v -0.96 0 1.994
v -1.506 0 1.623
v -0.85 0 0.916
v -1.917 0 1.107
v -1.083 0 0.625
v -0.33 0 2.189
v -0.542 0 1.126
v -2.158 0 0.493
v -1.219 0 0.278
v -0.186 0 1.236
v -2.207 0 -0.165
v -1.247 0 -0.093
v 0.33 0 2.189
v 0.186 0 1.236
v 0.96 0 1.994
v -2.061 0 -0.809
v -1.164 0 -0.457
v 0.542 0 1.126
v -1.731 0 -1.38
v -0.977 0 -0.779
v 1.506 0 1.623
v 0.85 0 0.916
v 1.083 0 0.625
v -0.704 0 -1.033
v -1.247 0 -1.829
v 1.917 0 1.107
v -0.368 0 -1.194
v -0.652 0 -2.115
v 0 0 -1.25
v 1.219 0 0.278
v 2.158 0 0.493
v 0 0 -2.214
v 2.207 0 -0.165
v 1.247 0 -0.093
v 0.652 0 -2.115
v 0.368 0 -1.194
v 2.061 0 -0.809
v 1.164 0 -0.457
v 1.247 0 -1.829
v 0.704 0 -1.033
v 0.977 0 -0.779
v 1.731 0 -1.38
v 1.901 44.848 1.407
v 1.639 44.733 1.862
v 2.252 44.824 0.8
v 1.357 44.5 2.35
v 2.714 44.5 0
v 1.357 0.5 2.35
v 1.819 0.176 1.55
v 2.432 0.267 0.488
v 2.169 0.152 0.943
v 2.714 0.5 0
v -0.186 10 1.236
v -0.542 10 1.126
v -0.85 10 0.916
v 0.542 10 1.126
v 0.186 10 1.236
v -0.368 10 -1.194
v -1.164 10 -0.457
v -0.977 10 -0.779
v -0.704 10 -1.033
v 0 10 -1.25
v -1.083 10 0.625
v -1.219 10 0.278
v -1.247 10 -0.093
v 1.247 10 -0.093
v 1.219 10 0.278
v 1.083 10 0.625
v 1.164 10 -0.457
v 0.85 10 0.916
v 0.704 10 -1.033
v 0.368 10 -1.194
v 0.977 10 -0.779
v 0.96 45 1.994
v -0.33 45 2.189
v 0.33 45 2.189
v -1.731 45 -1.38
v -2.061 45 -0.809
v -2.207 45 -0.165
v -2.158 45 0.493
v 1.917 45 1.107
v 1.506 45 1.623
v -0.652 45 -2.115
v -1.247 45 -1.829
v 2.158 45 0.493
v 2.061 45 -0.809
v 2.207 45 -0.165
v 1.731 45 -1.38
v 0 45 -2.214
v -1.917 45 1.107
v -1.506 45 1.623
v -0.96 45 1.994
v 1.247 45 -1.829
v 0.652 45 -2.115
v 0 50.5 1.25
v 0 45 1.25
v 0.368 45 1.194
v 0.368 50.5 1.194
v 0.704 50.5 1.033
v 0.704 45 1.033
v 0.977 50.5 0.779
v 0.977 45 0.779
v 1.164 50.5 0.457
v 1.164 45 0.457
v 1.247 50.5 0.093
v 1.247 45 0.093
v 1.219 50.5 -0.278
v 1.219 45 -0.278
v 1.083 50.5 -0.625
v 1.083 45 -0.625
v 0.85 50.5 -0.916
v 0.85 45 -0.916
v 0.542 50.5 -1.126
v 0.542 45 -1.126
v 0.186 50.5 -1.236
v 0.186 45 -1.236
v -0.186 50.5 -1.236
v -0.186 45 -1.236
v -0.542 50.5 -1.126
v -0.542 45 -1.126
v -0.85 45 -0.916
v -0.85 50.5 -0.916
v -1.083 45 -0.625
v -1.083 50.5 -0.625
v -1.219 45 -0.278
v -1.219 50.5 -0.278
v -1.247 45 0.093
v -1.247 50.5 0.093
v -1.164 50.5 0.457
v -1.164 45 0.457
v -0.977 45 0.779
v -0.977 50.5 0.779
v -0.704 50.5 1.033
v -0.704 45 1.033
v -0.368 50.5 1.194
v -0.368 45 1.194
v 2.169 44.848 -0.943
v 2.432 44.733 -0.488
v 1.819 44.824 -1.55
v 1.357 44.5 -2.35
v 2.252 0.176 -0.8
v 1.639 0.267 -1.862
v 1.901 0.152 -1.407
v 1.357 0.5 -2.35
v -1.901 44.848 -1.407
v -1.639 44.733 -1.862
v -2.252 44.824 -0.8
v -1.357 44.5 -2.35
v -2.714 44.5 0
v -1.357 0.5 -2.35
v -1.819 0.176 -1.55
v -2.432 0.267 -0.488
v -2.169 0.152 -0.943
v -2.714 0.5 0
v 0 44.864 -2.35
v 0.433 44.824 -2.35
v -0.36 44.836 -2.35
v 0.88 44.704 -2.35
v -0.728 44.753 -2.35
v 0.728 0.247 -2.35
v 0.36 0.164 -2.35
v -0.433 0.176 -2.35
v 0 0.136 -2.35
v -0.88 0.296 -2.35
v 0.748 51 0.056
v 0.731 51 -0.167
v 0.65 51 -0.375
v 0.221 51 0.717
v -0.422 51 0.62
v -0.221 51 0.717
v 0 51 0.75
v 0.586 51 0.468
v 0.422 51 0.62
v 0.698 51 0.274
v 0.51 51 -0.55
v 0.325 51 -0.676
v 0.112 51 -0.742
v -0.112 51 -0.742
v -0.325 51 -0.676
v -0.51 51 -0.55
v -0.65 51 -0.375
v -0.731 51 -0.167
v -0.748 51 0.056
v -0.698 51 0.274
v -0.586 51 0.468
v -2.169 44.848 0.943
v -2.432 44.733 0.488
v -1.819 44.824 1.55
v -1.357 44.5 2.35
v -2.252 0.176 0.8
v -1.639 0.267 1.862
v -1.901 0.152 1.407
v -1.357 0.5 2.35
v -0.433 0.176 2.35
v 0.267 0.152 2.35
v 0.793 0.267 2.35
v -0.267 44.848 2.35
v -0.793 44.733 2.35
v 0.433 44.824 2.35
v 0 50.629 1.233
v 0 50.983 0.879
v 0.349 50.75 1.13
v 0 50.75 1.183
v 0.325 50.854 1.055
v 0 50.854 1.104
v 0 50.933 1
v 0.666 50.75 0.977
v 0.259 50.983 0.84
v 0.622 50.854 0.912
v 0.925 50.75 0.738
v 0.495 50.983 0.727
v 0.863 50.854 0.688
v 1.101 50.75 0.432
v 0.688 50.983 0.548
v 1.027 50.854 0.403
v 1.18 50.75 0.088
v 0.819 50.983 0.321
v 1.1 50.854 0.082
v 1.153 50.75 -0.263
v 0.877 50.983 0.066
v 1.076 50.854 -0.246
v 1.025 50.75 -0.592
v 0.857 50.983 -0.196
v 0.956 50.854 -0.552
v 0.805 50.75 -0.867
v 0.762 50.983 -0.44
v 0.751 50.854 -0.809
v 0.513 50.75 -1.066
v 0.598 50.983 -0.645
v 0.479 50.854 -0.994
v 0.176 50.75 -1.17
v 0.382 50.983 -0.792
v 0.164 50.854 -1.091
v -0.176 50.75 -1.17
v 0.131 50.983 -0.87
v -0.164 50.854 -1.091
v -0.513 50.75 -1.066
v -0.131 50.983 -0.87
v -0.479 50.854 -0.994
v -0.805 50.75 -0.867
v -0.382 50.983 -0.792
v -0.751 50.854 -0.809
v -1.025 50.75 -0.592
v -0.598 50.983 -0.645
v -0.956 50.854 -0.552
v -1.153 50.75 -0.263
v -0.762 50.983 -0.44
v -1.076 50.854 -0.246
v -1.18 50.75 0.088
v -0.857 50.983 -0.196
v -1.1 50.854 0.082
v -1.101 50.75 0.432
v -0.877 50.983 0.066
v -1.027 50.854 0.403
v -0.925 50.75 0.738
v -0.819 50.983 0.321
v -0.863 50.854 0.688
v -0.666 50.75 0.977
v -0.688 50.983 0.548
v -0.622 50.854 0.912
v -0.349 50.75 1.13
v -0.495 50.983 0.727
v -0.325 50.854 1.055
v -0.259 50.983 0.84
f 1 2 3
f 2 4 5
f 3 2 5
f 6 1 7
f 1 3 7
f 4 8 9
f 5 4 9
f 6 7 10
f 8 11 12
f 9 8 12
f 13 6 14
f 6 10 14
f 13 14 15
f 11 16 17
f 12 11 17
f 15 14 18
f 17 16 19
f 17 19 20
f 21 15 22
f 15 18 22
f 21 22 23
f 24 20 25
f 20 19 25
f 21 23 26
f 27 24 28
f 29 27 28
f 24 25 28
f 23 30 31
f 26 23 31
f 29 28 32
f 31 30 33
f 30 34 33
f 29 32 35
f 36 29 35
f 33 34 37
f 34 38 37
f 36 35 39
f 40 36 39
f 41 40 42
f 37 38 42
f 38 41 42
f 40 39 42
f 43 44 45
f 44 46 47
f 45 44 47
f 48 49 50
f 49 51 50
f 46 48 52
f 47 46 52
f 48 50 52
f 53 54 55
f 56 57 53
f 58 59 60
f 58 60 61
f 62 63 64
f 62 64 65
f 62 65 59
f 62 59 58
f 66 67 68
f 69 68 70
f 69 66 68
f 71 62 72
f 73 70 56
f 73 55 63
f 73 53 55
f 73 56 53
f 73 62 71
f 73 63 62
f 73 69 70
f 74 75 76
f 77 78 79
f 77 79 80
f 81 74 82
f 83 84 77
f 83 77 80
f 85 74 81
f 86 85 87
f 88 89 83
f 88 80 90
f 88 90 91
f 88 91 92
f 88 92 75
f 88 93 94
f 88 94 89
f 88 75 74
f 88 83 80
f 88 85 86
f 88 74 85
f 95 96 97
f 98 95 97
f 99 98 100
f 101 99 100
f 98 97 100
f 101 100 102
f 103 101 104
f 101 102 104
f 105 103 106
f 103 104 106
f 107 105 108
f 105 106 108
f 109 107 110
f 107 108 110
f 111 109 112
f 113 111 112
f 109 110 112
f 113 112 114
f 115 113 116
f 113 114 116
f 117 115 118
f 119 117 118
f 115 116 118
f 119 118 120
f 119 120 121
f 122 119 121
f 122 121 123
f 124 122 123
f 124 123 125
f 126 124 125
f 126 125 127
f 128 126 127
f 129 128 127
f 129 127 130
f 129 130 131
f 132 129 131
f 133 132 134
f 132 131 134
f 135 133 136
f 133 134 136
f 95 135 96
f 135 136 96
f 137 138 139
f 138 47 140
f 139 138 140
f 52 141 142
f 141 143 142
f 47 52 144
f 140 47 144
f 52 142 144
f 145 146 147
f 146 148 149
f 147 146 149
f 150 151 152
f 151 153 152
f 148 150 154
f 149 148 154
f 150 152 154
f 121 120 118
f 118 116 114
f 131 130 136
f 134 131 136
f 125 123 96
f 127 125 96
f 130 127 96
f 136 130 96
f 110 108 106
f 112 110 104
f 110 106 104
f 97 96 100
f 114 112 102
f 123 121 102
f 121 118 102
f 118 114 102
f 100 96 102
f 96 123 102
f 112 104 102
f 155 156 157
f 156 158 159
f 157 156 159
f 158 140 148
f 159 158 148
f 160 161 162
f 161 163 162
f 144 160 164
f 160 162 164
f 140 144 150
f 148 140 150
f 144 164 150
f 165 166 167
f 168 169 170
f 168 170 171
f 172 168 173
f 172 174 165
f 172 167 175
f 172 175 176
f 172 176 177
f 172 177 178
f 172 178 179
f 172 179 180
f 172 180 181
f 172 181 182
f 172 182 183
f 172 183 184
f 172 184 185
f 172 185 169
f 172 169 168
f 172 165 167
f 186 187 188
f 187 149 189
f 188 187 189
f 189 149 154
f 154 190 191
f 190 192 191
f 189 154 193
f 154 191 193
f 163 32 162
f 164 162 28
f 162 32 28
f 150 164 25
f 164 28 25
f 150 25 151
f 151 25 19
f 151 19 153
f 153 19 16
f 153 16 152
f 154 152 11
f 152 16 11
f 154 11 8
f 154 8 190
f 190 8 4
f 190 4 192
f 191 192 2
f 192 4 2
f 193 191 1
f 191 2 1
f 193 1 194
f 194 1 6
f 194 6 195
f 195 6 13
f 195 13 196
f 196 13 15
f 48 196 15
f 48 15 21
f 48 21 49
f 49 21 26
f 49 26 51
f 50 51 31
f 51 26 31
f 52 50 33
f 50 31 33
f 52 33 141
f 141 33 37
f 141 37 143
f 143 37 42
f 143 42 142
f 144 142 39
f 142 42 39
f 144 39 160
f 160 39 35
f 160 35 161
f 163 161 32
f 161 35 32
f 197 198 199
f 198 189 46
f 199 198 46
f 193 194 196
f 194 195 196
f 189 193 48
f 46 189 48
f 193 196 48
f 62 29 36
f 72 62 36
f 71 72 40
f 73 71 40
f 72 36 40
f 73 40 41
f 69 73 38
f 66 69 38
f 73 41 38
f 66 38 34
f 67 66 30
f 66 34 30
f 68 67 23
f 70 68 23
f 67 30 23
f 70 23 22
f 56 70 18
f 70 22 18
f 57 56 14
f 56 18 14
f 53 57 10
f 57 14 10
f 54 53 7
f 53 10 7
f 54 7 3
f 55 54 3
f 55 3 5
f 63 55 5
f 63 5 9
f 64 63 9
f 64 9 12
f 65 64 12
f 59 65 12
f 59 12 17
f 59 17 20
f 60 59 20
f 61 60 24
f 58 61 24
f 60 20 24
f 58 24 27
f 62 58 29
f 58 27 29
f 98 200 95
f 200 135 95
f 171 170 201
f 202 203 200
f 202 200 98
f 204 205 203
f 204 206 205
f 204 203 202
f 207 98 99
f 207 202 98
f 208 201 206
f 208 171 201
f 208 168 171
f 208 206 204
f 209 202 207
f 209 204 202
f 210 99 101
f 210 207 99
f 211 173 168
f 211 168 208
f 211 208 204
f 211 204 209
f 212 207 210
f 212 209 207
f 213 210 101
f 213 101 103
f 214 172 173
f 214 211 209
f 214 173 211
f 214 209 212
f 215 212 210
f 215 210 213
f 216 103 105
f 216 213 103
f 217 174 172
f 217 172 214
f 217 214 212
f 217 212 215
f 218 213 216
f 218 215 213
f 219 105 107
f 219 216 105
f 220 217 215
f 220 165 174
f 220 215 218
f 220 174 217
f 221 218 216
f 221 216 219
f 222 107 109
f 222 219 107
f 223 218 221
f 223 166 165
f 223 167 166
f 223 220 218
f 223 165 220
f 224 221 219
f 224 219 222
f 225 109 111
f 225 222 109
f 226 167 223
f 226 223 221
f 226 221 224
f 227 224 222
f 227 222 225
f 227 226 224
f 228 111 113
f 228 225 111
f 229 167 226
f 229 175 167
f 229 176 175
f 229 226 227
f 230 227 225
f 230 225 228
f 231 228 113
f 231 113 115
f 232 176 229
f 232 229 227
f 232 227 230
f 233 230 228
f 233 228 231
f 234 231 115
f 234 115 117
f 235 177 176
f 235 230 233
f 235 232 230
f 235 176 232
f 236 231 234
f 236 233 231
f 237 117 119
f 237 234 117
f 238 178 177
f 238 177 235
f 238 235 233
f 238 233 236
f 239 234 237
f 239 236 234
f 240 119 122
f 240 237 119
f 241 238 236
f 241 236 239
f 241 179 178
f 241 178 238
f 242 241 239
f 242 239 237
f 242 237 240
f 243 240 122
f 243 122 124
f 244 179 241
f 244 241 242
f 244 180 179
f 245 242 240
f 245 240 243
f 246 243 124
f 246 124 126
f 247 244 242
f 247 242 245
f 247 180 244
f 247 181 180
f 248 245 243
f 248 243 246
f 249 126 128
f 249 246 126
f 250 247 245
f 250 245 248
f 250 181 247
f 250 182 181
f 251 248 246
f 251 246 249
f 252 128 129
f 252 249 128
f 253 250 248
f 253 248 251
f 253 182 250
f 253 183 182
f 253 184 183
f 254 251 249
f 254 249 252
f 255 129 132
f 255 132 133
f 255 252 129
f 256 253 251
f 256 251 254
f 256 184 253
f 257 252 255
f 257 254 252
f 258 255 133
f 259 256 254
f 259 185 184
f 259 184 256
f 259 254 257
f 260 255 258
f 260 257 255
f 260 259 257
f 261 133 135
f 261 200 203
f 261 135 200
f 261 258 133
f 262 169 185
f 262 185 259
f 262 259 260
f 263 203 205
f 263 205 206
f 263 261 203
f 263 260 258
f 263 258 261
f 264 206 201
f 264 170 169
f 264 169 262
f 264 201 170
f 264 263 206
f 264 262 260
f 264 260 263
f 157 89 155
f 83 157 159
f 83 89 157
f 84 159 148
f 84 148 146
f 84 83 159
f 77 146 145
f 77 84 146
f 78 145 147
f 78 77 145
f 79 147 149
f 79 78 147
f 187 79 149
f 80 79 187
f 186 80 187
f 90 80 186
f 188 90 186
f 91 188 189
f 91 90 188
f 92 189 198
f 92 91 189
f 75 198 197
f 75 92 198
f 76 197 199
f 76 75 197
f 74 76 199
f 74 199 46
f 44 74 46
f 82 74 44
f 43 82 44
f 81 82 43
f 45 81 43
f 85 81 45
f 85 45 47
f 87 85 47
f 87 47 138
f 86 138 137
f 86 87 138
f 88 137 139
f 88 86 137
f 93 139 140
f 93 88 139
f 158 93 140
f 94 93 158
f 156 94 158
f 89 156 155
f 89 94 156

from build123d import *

# Parameters (mm, degrees)
EXTRUDE_1_DEPTH     = 45
SKETCH_2_R          = 1.25
CUT_EXTRUDE_1_DEPTH = 10
SKETCH_4_R          = 1.25
EXTRUDE_2_DEPTH     = 6
FILLET_1_R          = 0.5


with BuildPart() as part:
    # 草图1 → 凸台-拉伸1 (new body)
    with BuildSketch(Plane(origin=(0, 0, 0), x_dir=(1, 0, 0), z_dir=(0, 1, 0))):
        Polygon((2.713546265, 0), (1.356773133, 2.35), (-1.356773133, 2.35), (-2.713546265, 0), (-1.356773133, -2.35), (1.356773133, -2.35), align=None)
    extrude(amount=EXTRUDE_1_DEPTH)

    # 草图2 → 切除-拉伸1 (cut)
    with BuildSketch(Plane.XZ):
        with Locations(Location((0, 0, 0), (0, 0, 270))):
            Circle(SKETCH_2_R)
    extrude(amount=-CUT_EXTRUDE_1_DEPTH, mode=Mode.SUBTRACT)

    # 草图7 → 切除-旋转4 (revolve, cut)
    with BuildSketch(Plane.XY, mode=Mode.PRIVATE) as cut_revolve_4_sk:
        Polygon((-2.713546265, 45), (-2.713546265, 44.5), (-2.213546265, 45), align=None)
    cut_revolve_4 = revolve(cut_revolve_4_sk.sketch.rotate(Axis((0, 0, 0), (0, 1, 0)), 270), axis=Axis((0, 0, 0), (0, 1, 0)), mode=Mode.SUBTRACT)

    # 镜向1: 切除-旋转4 across plane
    add(cut_revolve_4.mirror(Plane(origin=(0, 22.5, 0), x_dir=(0, 0, 1), z_dir=(0, -1, 0))), mode=Mode.SUBTRACT)


with BuildPart() as body_2:
    # 草图4 → 凸台-拉伸2 (new body)
    with BuildSketch(Plane(origin=(0, 45, 0), x_dir=(1, 0, 0), z_dir=(0, 1, 0))):
        with Locations(Location((0, 0, 0), (0, 0, 270))):
            Circle(SKETCH_4_R)
    extrude(amount=EXTRUDE_2_DEPTH)

    # 圆角1
    fillet_1_edges = [body_2.edges().sort_by_distance(p)[0] for p in [
        (0, 51, -1.25),
    ]]
    fillet(fillet_1_edges, radius=FILLET_1_R)


solid = Compound([part.part, body_2.part])
